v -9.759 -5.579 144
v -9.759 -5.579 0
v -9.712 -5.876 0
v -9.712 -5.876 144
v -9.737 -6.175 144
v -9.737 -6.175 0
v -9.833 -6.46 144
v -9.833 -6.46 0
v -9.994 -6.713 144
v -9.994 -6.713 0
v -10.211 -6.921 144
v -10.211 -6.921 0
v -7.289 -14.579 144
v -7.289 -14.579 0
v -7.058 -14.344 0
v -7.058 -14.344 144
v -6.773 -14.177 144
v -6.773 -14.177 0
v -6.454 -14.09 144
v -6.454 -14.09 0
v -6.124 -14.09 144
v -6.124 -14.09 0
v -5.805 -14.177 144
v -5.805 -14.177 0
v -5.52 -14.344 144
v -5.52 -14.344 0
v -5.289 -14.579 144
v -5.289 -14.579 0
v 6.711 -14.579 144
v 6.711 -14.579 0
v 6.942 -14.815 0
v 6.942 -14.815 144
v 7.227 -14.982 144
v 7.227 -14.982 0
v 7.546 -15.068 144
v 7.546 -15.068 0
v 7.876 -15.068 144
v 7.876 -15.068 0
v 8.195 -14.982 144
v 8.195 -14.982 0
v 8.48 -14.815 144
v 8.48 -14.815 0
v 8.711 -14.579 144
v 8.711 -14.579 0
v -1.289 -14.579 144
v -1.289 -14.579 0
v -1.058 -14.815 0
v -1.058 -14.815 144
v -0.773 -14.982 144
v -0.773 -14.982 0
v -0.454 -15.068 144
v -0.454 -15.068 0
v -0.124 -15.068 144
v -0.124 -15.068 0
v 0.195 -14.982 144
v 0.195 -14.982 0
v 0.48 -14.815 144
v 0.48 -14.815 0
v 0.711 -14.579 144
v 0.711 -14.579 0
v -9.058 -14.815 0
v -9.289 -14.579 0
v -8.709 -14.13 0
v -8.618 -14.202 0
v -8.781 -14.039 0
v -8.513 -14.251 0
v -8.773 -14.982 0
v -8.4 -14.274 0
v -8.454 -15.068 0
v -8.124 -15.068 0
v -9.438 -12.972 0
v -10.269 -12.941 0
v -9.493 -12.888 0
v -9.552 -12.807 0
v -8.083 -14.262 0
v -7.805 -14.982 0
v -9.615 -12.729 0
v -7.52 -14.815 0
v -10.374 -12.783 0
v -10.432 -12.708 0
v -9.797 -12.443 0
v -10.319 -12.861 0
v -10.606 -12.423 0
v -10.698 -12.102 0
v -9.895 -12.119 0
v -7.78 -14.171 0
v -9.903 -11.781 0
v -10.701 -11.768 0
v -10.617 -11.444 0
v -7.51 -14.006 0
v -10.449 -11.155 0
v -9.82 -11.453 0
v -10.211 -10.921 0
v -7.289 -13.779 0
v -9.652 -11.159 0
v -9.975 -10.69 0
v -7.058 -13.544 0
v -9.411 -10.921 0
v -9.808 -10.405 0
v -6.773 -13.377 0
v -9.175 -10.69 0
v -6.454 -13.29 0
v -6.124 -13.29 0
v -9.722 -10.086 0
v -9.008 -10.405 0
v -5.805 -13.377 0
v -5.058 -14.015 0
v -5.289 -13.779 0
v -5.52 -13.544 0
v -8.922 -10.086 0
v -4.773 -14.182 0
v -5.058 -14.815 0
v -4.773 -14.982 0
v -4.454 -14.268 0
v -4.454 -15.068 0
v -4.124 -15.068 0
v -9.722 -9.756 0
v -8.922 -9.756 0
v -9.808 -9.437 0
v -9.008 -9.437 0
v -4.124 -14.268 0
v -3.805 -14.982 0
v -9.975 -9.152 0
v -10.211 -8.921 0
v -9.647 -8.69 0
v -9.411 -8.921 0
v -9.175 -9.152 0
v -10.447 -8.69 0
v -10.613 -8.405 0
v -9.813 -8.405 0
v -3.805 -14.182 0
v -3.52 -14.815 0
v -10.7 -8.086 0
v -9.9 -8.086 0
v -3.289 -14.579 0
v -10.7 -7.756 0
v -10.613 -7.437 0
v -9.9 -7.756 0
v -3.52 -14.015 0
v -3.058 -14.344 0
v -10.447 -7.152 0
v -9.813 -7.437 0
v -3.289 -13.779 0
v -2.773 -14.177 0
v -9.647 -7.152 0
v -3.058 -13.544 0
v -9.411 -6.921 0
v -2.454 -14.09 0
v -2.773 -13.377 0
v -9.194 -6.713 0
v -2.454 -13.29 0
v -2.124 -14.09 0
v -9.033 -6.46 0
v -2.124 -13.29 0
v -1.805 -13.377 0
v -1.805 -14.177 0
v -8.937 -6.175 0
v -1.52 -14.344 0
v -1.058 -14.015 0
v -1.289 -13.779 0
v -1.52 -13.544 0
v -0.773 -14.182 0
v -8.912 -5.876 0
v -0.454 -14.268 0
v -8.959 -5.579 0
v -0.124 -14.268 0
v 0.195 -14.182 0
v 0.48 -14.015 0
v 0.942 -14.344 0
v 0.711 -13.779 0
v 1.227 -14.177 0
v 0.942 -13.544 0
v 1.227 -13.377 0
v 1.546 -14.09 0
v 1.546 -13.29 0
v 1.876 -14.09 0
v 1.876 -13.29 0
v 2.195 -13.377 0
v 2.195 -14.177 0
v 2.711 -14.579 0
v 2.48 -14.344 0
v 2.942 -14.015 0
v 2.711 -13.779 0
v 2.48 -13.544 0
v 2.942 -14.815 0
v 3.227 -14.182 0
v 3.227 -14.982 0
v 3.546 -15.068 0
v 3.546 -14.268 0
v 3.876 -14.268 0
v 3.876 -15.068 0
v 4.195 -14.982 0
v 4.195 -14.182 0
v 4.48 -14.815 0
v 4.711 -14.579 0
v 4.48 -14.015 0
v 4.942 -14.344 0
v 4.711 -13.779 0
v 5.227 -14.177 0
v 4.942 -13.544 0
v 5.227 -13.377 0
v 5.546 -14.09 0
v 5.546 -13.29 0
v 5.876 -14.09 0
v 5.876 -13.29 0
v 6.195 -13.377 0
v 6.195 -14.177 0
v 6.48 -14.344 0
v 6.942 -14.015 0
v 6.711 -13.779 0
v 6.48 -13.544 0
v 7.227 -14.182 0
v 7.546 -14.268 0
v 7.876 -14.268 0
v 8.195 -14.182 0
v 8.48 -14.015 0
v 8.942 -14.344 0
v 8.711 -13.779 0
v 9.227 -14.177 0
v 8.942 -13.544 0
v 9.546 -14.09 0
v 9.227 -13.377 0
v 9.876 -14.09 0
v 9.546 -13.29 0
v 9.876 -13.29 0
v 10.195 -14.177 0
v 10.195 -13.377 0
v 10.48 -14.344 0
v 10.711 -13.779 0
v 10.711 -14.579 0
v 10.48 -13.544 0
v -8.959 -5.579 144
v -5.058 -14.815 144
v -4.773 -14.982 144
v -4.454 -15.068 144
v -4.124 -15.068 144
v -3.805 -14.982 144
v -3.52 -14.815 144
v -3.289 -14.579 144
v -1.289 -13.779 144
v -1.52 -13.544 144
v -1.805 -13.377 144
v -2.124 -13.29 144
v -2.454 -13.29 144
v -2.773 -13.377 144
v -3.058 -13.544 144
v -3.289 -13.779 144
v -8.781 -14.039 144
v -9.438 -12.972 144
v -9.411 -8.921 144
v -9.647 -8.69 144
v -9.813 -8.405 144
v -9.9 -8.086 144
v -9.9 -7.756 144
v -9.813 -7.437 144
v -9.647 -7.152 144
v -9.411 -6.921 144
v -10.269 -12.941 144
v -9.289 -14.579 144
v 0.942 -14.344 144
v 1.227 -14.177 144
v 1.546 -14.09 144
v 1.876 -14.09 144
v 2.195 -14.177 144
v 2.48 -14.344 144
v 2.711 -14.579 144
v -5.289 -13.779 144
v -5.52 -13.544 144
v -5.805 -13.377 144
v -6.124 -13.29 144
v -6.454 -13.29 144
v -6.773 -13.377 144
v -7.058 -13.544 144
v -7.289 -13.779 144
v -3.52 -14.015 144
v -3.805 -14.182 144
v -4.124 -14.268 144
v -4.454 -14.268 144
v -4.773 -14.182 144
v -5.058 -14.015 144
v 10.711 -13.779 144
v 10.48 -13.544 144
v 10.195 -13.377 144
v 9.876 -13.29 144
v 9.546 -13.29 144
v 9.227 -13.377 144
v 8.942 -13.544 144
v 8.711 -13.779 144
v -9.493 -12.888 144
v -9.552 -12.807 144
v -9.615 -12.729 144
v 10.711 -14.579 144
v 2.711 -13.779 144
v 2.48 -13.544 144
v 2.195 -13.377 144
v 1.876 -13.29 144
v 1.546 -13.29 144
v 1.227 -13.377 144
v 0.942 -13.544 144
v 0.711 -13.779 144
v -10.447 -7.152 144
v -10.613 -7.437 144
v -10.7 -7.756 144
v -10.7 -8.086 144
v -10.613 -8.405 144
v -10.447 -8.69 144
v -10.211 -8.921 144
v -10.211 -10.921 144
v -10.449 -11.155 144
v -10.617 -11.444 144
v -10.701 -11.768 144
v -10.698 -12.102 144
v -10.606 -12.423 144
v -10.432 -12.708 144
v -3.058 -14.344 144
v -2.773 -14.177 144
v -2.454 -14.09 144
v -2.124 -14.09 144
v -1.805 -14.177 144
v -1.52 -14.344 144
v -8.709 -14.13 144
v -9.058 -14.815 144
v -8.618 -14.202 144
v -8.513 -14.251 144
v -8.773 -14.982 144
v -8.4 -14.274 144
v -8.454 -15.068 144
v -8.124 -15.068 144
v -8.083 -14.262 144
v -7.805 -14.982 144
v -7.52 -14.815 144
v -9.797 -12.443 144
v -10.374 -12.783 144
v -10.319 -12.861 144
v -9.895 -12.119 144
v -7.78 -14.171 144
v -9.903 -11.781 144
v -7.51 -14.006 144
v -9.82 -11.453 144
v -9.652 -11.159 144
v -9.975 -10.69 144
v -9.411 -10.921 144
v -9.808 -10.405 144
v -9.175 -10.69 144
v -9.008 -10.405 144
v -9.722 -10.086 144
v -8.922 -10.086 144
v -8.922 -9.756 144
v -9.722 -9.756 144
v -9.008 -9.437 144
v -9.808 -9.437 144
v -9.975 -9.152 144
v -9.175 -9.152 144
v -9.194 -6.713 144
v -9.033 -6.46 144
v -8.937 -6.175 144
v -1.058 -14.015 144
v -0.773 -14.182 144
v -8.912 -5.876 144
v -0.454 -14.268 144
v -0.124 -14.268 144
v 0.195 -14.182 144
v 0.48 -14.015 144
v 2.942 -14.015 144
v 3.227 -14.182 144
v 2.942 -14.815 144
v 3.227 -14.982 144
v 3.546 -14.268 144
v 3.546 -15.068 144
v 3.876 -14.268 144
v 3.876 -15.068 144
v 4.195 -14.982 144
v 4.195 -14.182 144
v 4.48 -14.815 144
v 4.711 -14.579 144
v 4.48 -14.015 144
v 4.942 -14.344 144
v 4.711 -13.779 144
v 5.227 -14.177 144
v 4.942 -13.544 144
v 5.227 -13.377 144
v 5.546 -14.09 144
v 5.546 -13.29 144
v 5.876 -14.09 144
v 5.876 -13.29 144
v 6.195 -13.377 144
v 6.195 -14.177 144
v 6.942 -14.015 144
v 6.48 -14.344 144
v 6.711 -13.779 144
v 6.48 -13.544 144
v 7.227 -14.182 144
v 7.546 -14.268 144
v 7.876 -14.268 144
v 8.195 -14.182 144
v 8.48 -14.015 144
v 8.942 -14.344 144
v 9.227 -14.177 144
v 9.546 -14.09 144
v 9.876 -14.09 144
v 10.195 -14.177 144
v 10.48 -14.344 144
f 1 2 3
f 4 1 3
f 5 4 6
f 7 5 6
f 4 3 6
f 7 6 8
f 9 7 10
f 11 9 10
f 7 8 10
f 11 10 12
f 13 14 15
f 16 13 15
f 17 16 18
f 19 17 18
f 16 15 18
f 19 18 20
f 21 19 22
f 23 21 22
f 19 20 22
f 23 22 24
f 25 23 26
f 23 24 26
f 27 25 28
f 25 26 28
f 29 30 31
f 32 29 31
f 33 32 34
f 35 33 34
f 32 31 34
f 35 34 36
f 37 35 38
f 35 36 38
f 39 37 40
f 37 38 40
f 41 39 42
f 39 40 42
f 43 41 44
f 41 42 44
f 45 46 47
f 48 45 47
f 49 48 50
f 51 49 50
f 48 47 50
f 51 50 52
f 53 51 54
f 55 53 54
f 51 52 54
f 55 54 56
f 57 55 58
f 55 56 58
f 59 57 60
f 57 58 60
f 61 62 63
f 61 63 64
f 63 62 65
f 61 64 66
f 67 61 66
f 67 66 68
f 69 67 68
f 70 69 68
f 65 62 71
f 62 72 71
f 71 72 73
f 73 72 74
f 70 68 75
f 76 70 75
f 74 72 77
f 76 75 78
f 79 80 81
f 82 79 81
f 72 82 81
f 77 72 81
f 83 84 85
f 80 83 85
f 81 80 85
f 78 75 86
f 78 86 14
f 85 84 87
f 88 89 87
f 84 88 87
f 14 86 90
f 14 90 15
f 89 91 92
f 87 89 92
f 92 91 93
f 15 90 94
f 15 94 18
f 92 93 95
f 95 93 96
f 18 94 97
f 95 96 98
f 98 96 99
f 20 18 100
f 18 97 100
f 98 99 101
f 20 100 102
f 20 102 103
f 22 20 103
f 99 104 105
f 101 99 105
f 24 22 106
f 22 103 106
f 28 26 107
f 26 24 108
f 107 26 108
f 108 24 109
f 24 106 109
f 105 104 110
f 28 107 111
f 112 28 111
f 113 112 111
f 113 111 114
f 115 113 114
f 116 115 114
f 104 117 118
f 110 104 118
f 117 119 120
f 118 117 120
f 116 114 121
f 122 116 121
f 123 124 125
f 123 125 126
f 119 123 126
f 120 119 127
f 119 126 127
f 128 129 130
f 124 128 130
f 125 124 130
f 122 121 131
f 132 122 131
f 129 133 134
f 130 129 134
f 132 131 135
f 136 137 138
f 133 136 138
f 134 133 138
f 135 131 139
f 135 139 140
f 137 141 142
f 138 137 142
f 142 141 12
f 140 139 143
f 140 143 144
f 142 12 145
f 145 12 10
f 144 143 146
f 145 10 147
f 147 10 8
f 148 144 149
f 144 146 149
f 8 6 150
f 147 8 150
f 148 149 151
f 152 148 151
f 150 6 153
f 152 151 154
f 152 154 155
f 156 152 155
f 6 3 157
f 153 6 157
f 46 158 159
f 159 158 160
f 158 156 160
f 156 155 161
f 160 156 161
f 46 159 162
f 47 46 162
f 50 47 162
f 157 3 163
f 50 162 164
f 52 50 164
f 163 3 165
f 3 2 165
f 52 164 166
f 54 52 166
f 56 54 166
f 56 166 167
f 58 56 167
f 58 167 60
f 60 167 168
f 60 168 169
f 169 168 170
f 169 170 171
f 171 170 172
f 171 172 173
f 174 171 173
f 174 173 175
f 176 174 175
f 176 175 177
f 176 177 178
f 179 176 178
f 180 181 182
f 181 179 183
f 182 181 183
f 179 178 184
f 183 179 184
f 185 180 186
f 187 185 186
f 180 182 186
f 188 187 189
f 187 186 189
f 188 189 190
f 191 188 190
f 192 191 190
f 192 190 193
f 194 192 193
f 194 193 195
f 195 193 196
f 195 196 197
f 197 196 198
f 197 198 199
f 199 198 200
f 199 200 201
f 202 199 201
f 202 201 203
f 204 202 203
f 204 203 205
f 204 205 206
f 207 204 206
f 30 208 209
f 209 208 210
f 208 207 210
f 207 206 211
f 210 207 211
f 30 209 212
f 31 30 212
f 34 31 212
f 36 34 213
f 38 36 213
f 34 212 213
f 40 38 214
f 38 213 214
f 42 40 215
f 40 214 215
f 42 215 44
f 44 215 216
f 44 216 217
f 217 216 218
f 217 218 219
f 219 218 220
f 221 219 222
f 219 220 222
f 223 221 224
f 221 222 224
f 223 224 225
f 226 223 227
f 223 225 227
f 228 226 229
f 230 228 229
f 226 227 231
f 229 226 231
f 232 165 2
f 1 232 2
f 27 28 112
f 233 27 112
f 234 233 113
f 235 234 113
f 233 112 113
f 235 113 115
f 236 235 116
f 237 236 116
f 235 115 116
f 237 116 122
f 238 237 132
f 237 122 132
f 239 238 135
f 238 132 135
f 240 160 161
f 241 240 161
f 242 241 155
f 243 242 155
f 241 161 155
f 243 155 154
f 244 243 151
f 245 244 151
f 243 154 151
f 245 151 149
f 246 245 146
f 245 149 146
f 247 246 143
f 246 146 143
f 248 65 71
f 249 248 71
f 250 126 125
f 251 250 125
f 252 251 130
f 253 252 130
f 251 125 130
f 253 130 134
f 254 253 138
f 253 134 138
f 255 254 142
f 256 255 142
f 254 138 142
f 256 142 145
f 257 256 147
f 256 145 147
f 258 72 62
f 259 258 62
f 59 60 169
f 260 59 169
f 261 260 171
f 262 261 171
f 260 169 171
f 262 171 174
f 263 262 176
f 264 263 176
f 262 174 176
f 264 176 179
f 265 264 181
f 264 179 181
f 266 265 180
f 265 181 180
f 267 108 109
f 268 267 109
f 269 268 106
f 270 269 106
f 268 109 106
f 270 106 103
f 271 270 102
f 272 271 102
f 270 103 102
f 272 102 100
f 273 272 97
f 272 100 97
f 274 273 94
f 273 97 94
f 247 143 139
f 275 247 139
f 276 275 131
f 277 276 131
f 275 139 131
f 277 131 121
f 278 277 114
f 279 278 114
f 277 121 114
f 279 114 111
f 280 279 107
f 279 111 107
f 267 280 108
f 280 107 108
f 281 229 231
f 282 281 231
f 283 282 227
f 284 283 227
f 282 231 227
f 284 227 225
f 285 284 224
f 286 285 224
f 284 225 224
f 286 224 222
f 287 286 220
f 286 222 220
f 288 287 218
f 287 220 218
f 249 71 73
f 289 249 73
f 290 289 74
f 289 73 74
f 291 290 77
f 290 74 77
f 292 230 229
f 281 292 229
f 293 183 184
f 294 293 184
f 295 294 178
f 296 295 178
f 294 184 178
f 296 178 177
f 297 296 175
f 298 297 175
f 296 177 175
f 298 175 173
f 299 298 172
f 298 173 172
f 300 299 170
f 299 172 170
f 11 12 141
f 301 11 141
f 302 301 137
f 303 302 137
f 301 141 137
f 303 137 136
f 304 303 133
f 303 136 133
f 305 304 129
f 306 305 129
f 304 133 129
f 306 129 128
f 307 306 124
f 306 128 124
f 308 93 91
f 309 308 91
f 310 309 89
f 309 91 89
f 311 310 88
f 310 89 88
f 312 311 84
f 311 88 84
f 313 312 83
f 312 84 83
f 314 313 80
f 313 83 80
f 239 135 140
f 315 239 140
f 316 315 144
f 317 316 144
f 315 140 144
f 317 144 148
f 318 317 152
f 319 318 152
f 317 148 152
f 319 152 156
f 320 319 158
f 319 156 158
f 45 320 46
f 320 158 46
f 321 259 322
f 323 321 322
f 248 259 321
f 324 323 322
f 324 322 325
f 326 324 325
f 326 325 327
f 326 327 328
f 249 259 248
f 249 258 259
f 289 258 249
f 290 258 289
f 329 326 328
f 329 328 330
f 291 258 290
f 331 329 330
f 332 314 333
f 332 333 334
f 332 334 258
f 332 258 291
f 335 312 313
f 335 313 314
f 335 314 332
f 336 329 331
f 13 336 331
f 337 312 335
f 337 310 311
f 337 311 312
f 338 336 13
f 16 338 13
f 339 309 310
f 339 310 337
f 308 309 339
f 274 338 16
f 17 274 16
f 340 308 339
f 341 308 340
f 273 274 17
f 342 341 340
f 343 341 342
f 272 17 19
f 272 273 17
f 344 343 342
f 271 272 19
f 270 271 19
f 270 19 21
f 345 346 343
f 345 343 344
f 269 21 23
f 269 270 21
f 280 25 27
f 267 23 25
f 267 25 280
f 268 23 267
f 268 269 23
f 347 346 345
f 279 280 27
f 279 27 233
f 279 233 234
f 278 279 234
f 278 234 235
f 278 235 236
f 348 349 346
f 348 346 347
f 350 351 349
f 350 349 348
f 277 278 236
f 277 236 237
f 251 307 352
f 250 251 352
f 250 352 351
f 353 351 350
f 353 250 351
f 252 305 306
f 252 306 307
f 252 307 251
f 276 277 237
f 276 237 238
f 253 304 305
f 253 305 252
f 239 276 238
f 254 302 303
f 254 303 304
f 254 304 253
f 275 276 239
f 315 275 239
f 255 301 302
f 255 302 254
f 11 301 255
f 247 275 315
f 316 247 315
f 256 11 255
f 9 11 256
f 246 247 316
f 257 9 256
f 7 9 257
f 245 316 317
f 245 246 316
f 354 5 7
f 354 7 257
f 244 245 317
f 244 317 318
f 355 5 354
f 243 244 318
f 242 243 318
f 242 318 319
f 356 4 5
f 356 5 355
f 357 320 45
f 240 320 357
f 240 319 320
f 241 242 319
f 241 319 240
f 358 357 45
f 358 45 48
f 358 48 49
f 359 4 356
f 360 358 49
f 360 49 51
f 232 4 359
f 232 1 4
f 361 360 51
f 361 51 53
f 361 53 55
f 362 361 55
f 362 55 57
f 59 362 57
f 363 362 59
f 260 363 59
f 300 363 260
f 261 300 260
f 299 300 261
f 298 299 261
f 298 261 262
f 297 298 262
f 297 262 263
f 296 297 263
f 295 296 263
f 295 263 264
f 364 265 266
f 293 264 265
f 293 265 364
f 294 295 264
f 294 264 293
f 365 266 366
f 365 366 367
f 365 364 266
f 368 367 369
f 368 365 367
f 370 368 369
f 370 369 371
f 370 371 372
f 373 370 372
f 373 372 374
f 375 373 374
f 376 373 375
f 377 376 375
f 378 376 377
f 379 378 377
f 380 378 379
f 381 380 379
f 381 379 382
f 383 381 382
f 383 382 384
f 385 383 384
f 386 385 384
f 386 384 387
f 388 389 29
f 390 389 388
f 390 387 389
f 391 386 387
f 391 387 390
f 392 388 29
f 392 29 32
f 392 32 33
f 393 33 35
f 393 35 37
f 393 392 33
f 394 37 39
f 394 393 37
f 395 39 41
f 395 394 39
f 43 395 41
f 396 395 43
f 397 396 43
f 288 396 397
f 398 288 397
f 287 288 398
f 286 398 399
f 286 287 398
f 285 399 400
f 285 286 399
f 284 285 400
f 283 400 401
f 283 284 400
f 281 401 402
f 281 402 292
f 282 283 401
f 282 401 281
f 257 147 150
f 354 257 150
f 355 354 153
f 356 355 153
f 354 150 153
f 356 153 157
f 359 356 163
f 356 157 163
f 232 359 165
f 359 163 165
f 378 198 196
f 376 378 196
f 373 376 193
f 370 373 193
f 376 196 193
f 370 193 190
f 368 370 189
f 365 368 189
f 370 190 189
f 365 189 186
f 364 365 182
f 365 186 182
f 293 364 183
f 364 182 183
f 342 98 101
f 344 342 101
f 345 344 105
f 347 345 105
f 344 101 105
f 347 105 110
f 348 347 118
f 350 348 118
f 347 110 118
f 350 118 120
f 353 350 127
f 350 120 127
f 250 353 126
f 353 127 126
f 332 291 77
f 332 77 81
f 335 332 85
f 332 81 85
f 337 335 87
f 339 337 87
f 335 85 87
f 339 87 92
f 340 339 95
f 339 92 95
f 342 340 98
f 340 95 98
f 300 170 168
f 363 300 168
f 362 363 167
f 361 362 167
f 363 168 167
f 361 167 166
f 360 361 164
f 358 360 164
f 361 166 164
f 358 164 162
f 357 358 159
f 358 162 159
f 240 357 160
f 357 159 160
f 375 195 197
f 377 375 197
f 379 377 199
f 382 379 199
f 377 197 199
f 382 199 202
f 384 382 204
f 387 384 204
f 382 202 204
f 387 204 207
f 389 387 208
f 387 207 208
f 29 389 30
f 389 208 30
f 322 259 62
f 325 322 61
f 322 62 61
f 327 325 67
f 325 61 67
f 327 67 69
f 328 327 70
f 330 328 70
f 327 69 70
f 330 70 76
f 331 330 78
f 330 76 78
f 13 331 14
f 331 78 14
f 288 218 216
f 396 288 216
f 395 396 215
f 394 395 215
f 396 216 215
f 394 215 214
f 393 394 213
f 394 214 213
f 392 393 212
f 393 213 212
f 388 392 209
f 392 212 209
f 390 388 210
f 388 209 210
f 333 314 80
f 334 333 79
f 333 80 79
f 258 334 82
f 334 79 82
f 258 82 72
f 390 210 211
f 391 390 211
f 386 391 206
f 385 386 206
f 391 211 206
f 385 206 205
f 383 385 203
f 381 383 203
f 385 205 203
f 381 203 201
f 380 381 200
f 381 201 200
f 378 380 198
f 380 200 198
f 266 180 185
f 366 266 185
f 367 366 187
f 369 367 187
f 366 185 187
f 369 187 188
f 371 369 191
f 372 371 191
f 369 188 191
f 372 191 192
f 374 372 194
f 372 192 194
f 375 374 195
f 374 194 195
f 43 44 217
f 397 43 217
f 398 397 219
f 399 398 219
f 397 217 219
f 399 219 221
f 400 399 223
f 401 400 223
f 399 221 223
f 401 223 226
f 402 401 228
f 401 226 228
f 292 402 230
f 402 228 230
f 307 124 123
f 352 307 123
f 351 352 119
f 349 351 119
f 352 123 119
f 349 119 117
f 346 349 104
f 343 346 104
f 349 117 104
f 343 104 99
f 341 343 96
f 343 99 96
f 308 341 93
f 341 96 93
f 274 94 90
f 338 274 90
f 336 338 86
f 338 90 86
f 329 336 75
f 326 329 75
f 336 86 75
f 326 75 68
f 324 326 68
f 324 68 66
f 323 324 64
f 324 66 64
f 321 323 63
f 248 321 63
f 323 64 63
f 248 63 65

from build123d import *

# Parameters (mm, degrees)
F1_DEPTH = 144


# Not quite as in the source:
# - ends of sketch curves that miss each other by under 0.0002 mm in the source are joined


with BuildPart() as f1:
    # F0 (on Top) → F1 (new body)
    with BuildSketch(Plane.XY):
        with BuildLine():
            ThreePointArc((-9.410914, -8.92081), (-9.910914, -7.92081), (-9.410914, -6.92081))
            ThreePointArc((-9.410914, -6.92081), (-8.9764458997, -6.320228727), (-8.9585015185, -5.57919))
            Line((-8.9585015185, -5.57919), (-9.7585015185, -5.57919))
            ThreePointArc((-9.7585015185, -5.57919), (-9.7764458997, -6.320228727), (-10.210914, -6.92081))
            ThreePointArc((-10.210914, -6.92081), (-10.710914, -7.92081), (-10.210914, -8.92081))
            ThreePointArc((-10.210914, -8.92081), (-9.710914, -9.92081), (-10.210914, -10.92081))
            ThreePointArc((-10.210914, -10.92081), (-10.7014813869, -11.7675371761), (-10.4317470851, -12.708200069))
            ThreePointArc((-10.4317470851, -12.708200069), (-10.3460553781, -12.8219008439), (-10.2686699127, -12.9414099478))
            Line((-10.2686699127, -12.9414099478), (-9.289086, -14.57919))
            ThreePointArc((-9.289086, -14.57919), (-8.289086, -15.07919), (-7.289086, -14.57919))
            ThreePointArc((-7.289086, -14.57919), (-6.289086, -14.07919), (-5.289086, -14.57919))
            ThreePointArc((-5.289086, -14.57919), (-4.289086, -15.07919), (-3.289086, -14.57919))
            ThreePointArc((-3.289086, -14.57919), (-2.289086, -14.07919), (-1.289086, -14.57919))
            ThreePointArc((-1.289086, -14.57919), (-0.289086, -15.07919), (0.710914, -14.57919))
            ThreePointArc((0.710914, -14.57919), (1.710914, -14.07919), (2.710914, -14.57919))
            ThreePointArc((2.710914, -14.57919), (3.710914, -15.07919), (4.710914, -14.57919))
            ThreePointArc((4.710914, -14.57919), (5.710914, -14.07919), (6.710914, -14.57919))
            ThreePointArc((6.710914, -14.57919), (7.710914, -15.07919), (8.710914, -14.57919))
            ThreePointArc((8.710914, -14.57919), (9.710914, -14.07919), (10.710914, -14.57919))
            Line((10.710914, -14.57919), (10.710914, -13.77919))
            ThreePointArc((10.710914, -13.77919), (9.710914, -13.27919), (8.710914, -13.77919))
            ThreePointArc((8.710914, -13.77919), (7.710914, -14.27919), (6.710914, -13.77919))
            ThreePointArc((6.710914, -13.77919), (5.710914, -13.27919), (4.710914, -13.77919))
            ThreePointArc((4.710914, -13.77919), (3.710914, -14.27919), (2.710914, -13.77919))
            ThreePointArc((2.710914, -13.77919), (1.710914, -13.27919), (0.710914, -13.77919))
            ThreePointArc((0.710914, -13.77919), (-0.289086, -14.27919), (-1.289086, -13.77919))
            ThreePointArc((-1.289086, -13.77919), (-2.289086, -13.27919), (-3.289086, -13.77919))
            ThreePointArc((-3.289086, -13.77919), (-4.289086, -14.27919), (-5.289086, -13.77919))
            ThreePointArc((-5.289086, -13.77919), (-6.289086, -13.27919), (-7.289086, -13.77919))
            ThreePointArc((-7.289086, -13.77919), (-7.7801177198, -14.1708779126), (-8.3996640349, -14.2742893929))
            ThreePointArc((-8.3996640349, -14.2742893929), (-8.6183007719, -14.2015740347), (-8.7811153103, -14.0385371912))
            Line((-8.7811153103, -14.0385371912), (-9.438132, -12.972224))
            ThreePointArc((-9.438132, -12.972224), (-9.5218512465, -12.8471466938), (-9.6147395194, -12.7287194399))
            ThreePointArc((-9.6147395194, -12.7287194399), (-9.9030448701, -11.7807710715), (-9.410914, -10.92081))
            ThreePointArc((-9.410914, -10.92081), (-8.910914, -9.92081), (-9.410914, -8.92081))
        make_face()
    extrude(amount=F1_DEPTH)


solid = f1.part
